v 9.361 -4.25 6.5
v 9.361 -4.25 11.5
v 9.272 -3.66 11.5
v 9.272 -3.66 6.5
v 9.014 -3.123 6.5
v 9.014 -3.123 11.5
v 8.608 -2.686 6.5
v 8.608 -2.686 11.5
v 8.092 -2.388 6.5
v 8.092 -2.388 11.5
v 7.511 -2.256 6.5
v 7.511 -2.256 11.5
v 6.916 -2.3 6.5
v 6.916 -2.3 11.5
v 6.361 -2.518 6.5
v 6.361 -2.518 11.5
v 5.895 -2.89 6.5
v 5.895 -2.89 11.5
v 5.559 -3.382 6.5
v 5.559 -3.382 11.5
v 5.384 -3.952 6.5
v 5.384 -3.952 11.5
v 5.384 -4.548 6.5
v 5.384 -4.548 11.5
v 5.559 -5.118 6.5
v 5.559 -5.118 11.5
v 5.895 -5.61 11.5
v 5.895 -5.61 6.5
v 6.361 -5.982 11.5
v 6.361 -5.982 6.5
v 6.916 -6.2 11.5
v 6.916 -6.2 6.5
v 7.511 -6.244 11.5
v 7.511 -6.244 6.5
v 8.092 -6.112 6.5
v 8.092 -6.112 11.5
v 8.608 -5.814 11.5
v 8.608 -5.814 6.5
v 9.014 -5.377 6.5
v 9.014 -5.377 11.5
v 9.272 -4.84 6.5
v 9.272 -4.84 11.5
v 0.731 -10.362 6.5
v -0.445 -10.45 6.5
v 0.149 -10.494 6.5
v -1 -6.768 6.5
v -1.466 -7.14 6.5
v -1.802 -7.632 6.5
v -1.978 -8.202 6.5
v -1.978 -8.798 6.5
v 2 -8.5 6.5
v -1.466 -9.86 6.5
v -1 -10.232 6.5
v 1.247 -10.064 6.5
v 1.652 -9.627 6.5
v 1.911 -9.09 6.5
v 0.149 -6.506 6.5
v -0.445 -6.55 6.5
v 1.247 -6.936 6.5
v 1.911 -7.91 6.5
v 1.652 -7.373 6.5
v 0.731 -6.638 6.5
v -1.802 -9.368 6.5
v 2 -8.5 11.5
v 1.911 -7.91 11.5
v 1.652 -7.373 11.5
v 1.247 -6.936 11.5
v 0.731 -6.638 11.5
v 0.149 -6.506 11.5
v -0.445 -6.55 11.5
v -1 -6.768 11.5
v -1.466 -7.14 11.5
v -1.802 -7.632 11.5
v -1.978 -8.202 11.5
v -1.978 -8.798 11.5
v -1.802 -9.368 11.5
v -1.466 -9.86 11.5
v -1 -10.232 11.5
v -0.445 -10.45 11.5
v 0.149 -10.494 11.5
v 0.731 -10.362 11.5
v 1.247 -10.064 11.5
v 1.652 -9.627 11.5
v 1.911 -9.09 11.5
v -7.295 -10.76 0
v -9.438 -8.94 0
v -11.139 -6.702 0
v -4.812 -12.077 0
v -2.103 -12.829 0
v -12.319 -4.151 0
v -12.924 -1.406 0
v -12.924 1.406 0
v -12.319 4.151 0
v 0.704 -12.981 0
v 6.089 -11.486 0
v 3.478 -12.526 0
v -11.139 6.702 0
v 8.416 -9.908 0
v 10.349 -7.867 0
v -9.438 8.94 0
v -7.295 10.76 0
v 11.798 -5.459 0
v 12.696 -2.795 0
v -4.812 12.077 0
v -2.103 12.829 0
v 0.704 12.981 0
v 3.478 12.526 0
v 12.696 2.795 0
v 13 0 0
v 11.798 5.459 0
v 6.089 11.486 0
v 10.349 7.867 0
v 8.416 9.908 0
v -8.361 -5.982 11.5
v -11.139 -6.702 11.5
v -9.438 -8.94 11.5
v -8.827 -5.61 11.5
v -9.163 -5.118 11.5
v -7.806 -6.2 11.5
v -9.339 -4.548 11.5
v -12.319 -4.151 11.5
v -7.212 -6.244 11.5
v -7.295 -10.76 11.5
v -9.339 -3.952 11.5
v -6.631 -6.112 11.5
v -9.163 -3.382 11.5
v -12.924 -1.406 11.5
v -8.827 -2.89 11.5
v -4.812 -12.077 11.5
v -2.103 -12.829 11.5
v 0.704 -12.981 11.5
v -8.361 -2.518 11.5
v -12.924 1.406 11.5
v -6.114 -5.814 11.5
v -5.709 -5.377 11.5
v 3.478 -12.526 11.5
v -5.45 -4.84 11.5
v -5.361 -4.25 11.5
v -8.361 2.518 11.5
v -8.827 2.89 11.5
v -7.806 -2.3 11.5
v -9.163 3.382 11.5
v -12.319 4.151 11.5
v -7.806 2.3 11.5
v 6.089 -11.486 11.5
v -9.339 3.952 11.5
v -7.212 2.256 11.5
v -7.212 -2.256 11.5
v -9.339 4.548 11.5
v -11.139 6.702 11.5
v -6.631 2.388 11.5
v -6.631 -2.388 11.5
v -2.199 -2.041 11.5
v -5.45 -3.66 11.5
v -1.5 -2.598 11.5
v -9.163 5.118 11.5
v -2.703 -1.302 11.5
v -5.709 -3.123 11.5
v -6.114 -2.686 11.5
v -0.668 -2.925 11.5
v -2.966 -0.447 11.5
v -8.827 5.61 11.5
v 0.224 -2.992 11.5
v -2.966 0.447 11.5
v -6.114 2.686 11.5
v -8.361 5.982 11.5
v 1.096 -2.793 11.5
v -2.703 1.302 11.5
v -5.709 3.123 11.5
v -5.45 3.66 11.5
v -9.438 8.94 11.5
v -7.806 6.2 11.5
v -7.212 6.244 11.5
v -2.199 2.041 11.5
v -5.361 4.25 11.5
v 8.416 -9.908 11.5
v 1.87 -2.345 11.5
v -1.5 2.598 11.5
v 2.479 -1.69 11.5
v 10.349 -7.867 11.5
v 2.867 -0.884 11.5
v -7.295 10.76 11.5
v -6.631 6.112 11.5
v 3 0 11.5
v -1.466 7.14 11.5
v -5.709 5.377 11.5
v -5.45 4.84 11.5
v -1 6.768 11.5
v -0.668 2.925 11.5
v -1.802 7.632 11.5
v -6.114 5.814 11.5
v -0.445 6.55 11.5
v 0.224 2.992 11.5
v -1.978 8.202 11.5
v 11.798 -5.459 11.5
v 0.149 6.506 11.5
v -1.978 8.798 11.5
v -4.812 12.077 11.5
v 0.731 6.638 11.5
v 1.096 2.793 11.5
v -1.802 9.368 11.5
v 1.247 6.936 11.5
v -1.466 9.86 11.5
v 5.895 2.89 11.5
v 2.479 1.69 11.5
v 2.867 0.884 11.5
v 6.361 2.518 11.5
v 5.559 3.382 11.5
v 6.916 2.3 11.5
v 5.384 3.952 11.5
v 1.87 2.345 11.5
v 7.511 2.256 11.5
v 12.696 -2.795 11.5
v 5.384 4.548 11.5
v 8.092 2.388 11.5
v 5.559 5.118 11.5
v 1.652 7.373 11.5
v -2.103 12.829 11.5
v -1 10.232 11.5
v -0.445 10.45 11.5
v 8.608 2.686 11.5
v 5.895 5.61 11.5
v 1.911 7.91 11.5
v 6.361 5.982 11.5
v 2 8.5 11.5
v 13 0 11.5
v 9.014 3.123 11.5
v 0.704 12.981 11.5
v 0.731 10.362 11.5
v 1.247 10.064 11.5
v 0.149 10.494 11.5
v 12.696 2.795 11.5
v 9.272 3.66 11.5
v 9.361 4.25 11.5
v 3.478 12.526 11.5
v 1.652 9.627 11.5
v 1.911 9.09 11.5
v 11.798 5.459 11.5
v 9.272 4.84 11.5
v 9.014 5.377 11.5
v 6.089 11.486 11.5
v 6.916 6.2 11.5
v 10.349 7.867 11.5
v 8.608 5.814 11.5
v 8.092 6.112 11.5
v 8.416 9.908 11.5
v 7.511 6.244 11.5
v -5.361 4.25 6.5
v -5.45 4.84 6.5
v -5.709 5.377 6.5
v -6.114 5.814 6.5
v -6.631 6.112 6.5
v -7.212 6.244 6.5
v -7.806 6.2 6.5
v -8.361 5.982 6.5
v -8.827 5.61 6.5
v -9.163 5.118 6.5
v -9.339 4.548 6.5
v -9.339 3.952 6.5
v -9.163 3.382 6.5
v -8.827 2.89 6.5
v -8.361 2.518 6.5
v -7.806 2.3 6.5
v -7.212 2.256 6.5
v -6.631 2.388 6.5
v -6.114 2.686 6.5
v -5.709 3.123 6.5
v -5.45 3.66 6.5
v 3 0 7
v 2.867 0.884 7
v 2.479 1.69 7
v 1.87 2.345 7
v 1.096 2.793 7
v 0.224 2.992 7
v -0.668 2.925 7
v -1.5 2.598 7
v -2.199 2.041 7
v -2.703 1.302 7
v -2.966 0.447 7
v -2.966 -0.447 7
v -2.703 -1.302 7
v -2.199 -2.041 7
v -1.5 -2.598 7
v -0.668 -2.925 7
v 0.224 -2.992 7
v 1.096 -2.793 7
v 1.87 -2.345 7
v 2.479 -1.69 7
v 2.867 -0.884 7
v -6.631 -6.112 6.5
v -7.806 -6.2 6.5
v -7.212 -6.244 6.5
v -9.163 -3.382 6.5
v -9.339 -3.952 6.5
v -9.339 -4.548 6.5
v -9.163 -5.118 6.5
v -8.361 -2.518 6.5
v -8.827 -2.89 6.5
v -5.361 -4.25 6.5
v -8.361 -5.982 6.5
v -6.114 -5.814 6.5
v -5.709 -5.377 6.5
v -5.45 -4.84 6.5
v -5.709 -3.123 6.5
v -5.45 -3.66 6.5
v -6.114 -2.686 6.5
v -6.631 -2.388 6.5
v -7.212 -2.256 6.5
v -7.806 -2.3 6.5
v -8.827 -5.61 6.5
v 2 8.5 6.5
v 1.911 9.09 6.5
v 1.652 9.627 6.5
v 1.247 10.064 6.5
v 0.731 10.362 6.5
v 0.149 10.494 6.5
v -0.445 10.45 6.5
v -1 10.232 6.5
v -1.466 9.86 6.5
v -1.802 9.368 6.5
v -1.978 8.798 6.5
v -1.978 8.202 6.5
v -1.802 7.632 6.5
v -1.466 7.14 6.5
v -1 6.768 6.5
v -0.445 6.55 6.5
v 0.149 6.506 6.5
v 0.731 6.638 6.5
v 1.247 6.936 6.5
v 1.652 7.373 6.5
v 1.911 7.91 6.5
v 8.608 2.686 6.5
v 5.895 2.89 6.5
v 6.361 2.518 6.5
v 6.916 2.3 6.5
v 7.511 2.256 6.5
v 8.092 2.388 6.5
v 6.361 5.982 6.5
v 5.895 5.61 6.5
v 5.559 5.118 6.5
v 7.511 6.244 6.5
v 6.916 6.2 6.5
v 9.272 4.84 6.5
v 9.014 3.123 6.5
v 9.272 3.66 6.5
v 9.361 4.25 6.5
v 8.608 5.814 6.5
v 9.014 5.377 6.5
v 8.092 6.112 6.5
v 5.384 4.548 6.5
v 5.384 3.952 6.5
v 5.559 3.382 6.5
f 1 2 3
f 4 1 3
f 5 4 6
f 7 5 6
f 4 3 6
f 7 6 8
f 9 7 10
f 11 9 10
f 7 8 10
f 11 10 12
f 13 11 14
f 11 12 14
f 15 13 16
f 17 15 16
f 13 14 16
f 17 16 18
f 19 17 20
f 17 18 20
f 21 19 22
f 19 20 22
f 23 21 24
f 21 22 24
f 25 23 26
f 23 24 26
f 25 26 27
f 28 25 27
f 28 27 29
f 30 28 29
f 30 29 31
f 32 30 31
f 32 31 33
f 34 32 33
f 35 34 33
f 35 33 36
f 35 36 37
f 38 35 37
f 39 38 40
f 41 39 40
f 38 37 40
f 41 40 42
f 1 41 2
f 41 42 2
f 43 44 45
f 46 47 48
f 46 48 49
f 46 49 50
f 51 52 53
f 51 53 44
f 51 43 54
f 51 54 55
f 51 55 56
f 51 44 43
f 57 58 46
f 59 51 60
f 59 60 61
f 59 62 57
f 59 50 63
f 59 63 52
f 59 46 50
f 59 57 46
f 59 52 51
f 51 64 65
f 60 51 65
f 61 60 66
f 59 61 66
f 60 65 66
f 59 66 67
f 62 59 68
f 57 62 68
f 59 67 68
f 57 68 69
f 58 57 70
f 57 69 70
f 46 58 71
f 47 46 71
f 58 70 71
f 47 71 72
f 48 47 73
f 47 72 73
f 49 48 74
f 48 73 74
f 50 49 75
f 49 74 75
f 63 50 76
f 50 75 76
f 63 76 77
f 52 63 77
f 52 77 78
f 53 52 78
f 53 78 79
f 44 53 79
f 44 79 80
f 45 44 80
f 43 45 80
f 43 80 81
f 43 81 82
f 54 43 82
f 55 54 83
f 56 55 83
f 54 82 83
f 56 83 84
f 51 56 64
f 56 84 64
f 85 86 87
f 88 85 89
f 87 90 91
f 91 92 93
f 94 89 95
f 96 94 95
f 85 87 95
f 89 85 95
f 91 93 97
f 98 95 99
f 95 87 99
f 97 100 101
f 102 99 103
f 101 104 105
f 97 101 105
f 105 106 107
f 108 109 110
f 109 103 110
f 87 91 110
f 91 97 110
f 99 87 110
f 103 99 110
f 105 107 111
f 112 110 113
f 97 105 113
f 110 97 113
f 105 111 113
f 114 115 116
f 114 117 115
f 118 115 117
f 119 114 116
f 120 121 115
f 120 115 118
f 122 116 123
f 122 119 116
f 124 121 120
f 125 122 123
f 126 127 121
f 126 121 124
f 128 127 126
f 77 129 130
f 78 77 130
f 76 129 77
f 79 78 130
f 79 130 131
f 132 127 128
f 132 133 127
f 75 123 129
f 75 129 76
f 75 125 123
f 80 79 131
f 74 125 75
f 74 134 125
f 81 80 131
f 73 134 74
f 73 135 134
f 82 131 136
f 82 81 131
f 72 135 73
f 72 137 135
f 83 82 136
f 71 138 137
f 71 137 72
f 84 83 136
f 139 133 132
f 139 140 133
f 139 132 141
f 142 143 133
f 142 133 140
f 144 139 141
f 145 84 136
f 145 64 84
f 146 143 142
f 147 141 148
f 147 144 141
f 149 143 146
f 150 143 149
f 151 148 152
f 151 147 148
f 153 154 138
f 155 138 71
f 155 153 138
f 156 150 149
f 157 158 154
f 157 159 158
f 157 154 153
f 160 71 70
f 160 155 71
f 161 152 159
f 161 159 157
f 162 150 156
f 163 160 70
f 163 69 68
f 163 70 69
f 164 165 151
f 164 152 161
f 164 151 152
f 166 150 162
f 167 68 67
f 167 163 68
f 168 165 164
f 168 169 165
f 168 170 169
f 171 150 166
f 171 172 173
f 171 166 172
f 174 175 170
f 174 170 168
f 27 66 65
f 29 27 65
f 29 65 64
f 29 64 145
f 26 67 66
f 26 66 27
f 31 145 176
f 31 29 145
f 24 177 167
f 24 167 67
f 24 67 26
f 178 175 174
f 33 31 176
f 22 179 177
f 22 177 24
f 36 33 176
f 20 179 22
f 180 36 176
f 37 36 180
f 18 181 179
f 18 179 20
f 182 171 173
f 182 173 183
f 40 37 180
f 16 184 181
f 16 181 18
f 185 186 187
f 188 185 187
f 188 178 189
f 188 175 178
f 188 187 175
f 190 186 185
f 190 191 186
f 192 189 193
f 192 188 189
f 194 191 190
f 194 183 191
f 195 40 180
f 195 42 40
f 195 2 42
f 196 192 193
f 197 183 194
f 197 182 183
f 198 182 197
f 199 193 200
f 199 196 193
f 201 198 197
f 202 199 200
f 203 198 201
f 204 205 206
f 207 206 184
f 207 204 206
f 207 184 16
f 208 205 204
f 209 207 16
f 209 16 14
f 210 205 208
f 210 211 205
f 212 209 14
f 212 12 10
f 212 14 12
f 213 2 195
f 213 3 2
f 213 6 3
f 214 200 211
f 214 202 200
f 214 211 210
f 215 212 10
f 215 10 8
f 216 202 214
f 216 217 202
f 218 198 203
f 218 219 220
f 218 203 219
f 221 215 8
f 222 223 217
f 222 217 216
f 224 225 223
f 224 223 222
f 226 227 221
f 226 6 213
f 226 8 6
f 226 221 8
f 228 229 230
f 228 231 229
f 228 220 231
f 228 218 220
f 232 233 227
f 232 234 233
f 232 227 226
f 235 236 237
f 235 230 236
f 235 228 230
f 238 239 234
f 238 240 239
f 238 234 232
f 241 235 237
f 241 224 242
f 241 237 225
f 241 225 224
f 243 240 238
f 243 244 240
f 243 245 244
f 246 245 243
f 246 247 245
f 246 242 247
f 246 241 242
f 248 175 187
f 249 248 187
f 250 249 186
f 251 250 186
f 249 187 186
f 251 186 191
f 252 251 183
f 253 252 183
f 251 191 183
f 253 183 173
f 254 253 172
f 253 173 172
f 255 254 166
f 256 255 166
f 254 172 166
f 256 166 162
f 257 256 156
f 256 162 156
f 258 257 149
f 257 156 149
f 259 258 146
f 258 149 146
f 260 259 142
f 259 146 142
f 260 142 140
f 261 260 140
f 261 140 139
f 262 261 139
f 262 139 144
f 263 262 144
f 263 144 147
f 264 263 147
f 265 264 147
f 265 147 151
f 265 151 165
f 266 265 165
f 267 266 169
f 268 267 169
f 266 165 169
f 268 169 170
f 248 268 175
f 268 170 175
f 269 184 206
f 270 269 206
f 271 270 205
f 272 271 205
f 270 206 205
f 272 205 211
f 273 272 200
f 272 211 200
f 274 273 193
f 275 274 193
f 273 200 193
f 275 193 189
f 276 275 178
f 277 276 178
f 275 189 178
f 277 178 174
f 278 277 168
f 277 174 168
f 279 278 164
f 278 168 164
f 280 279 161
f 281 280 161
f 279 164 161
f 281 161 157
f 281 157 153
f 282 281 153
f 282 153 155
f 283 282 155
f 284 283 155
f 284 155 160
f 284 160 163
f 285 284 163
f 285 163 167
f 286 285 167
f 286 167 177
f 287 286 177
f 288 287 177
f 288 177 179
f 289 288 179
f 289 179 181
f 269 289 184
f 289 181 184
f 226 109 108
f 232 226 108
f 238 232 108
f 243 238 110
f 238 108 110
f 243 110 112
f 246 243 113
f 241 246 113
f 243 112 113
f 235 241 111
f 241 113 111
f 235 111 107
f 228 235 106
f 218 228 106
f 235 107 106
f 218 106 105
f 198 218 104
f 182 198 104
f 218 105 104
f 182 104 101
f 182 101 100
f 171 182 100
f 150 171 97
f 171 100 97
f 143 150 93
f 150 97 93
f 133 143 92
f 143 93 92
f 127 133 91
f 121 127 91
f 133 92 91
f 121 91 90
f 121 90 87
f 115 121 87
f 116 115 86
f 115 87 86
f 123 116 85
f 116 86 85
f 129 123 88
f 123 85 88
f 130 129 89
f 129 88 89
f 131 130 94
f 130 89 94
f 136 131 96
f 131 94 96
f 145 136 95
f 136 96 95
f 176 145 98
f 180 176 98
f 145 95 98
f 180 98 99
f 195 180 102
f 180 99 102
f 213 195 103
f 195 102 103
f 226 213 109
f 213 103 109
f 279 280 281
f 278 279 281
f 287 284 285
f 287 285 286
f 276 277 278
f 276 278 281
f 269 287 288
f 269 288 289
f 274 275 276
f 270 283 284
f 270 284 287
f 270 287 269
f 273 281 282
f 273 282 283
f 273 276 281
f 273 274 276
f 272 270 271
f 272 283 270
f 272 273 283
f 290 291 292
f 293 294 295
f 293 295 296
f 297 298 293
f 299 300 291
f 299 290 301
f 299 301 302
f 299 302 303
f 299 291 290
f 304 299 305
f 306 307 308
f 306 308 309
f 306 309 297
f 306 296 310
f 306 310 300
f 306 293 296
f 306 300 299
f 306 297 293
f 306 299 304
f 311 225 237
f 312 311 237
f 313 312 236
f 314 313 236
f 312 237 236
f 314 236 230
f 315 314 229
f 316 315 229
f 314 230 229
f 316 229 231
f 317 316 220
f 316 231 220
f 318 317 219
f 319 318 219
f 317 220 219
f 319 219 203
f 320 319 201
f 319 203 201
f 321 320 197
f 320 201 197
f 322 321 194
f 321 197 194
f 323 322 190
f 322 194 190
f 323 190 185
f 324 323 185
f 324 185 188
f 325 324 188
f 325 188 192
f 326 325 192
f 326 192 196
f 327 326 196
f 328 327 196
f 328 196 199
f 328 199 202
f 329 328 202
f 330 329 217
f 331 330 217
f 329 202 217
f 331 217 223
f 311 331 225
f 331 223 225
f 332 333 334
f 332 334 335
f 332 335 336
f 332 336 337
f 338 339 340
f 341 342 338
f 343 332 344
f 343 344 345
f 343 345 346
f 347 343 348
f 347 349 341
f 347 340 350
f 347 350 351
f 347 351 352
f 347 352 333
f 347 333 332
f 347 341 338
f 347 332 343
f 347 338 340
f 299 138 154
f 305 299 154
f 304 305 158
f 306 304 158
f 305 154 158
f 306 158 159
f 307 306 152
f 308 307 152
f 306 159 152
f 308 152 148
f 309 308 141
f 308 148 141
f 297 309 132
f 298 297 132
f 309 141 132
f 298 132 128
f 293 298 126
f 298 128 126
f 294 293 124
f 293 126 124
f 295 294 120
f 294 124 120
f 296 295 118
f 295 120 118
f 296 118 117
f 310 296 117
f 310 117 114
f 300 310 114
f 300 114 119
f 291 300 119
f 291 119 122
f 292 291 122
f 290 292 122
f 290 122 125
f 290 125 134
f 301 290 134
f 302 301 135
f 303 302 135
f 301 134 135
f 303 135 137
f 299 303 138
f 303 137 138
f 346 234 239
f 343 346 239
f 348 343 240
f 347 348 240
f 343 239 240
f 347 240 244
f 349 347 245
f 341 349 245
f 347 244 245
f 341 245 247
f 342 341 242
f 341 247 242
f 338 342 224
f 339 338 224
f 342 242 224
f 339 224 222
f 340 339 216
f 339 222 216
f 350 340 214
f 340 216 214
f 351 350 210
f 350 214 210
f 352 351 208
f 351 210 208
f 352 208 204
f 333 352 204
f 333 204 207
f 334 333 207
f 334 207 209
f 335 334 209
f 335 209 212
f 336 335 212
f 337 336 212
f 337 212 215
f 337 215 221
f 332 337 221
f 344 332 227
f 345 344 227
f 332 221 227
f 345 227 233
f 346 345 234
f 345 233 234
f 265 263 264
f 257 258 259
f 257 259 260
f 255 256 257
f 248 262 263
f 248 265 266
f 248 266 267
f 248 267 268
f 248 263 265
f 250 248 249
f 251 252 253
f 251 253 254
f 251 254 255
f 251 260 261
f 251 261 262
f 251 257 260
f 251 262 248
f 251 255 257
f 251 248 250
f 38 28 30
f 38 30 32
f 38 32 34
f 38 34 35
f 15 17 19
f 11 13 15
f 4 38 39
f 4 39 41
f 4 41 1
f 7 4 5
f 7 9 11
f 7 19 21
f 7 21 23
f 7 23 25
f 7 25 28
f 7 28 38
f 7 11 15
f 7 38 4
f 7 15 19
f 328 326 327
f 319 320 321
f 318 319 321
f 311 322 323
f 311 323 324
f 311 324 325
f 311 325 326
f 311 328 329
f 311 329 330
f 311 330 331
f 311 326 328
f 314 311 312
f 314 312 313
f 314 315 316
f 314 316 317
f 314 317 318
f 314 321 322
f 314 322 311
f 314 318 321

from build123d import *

# Parameters (mm, degrees)
ESQUISSE1_R             = 13
BOSS_EXTRU_1_DEPTH      = 11.5
ESQUISSE2_R             = 2
ENL_V_MAT_EXTRU_1_DEPTH = 5
ESQUISSE3_R             = 3
ENL_V_MAT_EXTRU_2_DEPTH = 4.5


with BuildPart() as part:
    # Esquisse1 → Boss.-Extru.1 (new body)
    with BuildSketch(Plane.XY):
        Circle(ESQUISSE1_R)
    extrude(amount=BOSS_EXTRU_1_DEPTH)

    # Esquisse2 → Enlèv. mat.-Extru.1 (cut)
    with BuildSketch(Plane.XY.offset(11.5)):
        with Locations((0, 8.5)):
            Circle(ESQUISSE2_R)
        with Locations((-7.361215932, 4.25)):
            Circle(ESQUISSE2_R)
        with Locations((-7.361215932, -4.25)):
            Circle(ESQUISSE2_R)
        with Locations((0, -8.5)):
            Circle(ESQUISSE2_R)
        with Locations((7.361215932, -4.25)):
            Circle(ESQUISSE2_R)
        with Locations((7.361215932, 4.25)):
            Circle(ESQUISSE2_R)
    extrude(amount=-ENL_V_MAT_EXTRU_1_DEPTH, mode=Mode.SUBTRACT)

    # Esquisse3 → Enlèv. mat.-Extru.2 (cut)
    with BuildSketch(Plane.XY.offset(11.5)):
        Circle(ESQUISSE3_R)
    extrude(amount=-ENL_V_MAT_EXTRU_2_DEPTH, mode=Mode.SUBTRACT)


solid = part.part
